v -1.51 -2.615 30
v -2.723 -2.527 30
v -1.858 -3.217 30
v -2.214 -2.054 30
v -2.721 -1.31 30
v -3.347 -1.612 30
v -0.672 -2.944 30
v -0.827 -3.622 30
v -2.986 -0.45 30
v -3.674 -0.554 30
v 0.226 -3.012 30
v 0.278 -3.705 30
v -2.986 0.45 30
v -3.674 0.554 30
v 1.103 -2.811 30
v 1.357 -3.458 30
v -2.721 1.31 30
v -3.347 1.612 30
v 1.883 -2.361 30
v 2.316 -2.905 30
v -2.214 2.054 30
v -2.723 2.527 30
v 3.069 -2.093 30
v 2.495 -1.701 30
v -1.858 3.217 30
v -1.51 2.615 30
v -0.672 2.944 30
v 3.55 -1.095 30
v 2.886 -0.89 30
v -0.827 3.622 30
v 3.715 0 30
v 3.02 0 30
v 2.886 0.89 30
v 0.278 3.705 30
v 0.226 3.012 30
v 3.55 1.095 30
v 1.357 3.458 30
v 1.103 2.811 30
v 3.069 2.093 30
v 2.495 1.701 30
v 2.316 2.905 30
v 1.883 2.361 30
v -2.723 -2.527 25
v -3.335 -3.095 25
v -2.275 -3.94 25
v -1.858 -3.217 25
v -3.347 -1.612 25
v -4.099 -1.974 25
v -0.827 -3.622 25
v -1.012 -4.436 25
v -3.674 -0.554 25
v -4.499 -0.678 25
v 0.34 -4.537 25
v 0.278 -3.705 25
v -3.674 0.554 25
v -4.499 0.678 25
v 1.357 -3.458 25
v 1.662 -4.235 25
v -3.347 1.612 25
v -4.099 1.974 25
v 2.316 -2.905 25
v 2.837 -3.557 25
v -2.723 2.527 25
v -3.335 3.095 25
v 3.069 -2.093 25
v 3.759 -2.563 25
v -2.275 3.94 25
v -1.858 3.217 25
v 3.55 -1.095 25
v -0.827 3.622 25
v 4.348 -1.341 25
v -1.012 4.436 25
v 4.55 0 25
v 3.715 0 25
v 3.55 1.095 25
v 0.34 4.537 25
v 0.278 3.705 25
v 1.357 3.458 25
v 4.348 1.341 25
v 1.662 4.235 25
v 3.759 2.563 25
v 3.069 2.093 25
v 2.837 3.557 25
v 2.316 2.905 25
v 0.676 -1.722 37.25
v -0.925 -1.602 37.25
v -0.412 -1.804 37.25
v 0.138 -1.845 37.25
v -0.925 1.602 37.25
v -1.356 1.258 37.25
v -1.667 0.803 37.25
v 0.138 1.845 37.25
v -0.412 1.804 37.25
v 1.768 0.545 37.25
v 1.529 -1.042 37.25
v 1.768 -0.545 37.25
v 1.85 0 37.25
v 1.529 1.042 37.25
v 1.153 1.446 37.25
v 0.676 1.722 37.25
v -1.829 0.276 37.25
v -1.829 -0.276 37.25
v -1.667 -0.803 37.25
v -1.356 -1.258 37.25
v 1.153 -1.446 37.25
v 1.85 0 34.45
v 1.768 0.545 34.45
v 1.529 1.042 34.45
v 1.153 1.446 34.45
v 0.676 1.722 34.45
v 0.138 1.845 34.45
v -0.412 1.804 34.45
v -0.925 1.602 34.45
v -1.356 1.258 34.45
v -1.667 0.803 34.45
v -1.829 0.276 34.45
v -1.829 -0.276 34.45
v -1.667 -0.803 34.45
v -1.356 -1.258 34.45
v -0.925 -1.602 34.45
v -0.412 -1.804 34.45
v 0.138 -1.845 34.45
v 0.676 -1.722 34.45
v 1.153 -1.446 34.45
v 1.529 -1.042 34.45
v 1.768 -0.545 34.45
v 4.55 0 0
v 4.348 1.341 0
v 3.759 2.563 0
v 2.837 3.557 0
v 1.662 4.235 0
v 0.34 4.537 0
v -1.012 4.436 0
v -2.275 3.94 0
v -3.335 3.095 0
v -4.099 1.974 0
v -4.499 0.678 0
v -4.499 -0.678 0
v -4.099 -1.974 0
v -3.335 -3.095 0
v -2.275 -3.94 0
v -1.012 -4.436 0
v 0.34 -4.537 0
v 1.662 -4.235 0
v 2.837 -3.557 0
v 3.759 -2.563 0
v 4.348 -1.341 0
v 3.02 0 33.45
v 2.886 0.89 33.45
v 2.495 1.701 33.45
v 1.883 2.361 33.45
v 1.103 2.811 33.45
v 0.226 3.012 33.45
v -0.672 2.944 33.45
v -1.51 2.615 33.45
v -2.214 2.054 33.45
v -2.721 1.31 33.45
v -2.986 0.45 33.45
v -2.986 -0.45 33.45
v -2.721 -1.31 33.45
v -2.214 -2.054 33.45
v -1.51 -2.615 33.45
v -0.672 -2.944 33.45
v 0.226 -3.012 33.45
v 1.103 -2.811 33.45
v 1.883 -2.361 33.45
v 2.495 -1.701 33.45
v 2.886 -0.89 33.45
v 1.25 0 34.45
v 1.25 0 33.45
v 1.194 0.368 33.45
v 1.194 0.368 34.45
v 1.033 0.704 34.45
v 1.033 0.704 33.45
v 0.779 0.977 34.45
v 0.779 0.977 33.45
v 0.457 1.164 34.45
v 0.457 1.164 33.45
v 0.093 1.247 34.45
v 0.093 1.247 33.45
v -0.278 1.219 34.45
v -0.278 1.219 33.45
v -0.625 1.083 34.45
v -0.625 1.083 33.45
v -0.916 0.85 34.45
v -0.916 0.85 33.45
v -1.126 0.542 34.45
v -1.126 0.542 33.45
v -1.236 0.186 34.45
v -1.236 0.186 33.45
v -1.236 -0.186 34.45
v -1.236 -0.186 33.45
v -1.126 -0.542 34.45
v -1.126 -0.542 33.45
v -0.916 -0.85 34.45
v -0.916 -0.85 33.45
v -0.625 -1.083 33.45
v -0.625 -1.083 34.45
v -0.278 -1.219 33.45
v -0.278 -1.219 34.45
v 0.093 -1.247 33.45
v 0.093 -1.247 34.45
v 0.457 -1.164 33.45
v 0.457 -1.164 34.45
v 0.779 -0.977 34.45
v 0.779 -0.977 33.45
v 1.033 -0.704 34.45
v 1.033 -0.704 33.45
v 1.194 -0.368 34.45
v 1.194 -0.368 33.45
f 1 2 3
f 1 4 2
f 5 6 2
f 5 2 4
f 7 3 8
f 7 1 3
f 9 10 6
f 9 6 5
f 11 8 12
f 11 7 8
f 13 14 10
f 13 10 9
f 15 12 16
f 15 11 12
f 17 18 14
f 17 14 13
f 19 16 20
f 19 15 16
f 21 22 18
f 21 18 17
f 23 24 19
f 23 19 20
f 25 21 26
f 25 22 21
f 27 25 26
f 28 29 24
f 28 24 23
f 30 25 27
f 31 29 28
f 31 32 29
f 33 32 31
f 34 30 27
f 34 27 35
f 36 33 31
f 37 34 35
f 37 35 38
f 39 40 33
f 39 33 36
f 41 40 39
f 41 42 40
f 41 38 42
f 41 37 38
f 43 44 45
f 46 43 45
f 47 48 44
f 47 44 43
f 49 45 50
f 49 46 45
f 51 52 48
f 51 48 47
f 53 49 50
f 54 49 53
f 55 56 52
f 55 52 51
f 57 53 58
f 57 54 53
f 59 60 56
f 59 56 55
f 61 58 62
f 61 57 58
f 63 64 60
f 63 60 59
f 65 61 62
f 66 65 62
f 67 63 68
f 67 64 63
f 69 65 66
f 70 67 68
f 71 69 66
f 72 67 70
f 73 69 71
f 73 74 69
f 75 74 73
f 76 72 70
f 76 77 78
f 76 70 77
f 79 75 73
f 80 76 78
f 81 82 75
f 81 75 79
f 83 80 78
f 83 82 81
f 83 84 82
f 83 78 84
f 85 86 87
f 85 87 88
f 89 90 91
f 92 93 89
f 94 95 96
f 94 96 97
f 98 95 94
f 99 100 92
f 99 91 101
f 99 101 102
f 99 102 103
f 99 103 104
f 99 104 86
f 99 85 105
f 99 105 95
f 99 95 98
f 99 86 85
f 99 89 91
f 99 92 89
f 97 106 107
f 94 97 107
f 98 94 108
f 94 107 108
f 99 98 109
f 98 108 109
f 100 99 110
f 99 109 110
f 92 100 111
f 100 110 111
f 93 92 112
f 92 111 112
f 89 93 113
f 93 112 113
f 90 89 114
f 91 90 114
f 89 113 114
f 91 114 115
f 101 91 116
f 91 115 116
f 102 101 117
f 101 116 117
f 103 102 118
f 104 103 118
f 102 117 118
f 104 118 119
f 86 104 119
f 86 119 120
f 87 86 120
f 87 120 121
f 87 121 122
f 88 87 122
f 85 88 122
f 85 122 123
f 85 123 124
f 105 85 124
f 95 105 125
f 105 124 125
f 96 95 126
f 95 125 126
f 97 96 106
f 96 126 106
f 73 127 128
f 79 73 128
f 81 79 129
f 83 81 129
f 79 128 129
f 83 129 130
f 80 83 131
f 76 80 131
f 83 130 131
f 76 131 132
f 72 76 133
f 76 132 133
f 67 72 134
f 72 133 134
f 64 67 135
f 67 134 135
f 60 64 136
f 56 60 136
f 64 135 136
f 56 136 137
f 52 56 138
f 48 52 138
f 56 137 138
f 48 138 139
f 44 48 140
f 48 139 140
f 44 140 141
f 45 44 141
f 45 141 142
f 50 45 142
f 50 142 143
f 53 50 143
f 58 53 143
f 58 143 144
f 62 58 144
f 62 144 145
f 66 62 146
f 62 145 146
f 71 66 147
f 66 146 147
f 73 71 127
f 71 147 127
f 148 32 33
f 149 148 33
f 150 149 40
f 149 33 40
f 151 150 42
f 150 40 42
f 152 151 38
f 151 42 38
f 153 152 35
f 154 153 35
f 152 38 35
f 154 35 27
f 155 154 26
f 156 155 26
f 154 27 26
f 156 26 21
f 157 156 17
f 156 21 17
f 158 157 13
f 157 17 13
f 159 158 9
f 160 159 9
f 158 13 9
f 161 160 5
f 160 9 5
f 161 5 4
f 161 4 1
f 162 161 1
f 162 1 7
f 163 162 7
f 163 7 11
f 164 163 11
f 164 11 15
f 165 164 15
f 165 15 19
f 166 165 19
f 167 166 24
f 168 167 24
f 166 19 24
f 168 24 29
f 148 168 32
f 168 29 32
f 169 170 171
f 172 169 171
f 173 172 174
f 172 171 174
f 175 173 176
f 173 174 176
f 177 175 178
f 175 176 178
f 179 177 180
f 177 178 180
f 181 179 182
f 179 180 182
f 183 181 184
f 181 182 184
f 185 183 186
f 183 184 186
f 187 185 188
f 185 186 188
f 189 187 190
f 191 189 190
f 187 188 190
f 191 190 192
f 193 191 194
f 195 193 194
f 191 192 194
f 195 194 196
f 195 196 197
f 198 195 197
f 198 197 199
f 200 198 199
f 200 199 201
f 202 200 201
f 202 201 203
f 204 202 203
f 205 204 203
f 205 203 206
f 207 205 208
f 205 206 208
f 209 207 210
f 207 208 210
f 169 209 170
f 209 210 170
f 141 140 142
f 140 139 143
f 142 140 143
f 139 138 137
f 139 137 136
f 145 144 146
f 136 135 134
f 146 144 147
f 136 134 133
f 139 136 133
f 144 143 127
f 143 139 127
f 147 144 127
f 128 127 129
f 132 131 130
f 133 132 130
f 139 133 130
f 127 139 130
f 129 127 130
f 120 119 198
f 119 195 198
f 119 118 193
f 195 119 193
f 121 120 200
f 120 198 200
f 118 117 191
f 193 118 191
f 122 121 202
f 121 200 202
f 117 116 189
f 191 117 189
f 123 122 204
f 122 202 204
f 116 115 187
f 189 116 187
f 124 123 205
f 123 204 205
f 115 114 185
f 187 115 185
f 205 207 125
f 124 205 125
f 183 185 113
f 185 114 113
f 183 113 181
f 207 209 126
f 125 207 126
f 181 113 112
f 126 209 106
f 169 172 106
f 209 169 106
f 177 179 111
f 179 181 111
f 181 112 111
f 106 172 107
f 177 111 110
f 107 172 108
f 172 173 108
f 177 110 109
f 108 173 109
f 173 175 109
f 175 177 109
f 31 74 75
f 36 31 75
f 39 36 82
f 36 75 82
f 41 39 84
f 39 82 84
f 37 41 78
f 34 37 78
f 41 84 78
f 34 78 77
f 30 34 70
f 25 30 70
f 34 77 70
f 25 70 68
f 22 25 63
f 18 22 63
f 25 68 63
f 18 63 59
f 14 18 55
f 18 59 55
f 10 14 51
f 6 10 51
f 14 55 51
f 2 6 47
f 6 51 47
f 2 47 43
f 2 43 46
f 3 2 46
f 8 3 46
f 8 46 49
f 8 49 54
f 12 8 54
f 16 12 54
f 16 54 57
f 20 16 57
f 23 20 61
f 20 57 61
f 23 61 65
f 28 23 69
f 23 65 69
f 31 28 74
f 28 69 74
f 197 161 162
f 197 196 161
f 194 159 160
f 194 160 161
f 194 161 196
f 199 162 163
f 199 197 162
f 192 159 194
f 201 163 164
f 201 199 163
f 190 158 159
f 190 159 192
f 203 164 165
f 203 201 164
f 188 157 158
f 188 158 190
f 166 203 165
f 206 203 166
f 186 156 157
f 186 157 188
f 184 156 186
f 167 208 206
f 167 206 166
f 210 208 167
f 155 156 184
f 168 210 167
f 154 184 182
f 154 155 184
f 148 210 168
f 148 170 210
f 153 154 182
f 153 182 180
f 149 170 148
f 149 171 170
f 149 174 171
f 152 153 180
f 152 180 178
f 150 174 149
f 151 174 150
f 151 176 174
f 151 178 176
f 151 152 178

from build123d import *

# Parameters (mm, degrees)
F0_R     = 4.55
F1_DEPTH = 25
F2_R     = 3.715
F3_DEPTH = 5
F4_R     = 3.02
F5_DEPTH = 3.45
F6_R     = 1.25
F7_DEPTH = 1
F8_R     = 1.85
F8_R_2   = 1.25
F9_DEPTH = 2.8


with BuildPart() as f1:
    # F0 (on Top) → F1 (new body)
    with BuildSketch(Plane.XY):
        Circle(F0_R)
    extrude(amount=F1_DEPTH)

    # F2 (on face) → F3 (join)
    with BuildSketch(Plane.XY.offset(25)):
        Circle(F2_R)
    extrude(amount=F3_DEPTH)

    # F4 (on face) → F5 (join)
    with BuildSketch(Plane.XY.offset(30)):
        Circle(F4_R)
    extrude(amount=F5_DEPTH)

    # F6 (on face) → F7 (join)
    with BuildSketch(Plane.XY.offset(33.45)):
        Circle(F6_R)
    extrude(amount=F7_DEPTH)

    # F8 (on face) → F9 (join)
    with BuildSketch(Plane.XY.offset(34.45)):
        Circle(F8_R)
        Circle(F8_R_2, mode=Mode.SUBTRACT)
        Circle(F8_R_2)
    extrude(amount=F9_DEPTH)


solid = f1.part
